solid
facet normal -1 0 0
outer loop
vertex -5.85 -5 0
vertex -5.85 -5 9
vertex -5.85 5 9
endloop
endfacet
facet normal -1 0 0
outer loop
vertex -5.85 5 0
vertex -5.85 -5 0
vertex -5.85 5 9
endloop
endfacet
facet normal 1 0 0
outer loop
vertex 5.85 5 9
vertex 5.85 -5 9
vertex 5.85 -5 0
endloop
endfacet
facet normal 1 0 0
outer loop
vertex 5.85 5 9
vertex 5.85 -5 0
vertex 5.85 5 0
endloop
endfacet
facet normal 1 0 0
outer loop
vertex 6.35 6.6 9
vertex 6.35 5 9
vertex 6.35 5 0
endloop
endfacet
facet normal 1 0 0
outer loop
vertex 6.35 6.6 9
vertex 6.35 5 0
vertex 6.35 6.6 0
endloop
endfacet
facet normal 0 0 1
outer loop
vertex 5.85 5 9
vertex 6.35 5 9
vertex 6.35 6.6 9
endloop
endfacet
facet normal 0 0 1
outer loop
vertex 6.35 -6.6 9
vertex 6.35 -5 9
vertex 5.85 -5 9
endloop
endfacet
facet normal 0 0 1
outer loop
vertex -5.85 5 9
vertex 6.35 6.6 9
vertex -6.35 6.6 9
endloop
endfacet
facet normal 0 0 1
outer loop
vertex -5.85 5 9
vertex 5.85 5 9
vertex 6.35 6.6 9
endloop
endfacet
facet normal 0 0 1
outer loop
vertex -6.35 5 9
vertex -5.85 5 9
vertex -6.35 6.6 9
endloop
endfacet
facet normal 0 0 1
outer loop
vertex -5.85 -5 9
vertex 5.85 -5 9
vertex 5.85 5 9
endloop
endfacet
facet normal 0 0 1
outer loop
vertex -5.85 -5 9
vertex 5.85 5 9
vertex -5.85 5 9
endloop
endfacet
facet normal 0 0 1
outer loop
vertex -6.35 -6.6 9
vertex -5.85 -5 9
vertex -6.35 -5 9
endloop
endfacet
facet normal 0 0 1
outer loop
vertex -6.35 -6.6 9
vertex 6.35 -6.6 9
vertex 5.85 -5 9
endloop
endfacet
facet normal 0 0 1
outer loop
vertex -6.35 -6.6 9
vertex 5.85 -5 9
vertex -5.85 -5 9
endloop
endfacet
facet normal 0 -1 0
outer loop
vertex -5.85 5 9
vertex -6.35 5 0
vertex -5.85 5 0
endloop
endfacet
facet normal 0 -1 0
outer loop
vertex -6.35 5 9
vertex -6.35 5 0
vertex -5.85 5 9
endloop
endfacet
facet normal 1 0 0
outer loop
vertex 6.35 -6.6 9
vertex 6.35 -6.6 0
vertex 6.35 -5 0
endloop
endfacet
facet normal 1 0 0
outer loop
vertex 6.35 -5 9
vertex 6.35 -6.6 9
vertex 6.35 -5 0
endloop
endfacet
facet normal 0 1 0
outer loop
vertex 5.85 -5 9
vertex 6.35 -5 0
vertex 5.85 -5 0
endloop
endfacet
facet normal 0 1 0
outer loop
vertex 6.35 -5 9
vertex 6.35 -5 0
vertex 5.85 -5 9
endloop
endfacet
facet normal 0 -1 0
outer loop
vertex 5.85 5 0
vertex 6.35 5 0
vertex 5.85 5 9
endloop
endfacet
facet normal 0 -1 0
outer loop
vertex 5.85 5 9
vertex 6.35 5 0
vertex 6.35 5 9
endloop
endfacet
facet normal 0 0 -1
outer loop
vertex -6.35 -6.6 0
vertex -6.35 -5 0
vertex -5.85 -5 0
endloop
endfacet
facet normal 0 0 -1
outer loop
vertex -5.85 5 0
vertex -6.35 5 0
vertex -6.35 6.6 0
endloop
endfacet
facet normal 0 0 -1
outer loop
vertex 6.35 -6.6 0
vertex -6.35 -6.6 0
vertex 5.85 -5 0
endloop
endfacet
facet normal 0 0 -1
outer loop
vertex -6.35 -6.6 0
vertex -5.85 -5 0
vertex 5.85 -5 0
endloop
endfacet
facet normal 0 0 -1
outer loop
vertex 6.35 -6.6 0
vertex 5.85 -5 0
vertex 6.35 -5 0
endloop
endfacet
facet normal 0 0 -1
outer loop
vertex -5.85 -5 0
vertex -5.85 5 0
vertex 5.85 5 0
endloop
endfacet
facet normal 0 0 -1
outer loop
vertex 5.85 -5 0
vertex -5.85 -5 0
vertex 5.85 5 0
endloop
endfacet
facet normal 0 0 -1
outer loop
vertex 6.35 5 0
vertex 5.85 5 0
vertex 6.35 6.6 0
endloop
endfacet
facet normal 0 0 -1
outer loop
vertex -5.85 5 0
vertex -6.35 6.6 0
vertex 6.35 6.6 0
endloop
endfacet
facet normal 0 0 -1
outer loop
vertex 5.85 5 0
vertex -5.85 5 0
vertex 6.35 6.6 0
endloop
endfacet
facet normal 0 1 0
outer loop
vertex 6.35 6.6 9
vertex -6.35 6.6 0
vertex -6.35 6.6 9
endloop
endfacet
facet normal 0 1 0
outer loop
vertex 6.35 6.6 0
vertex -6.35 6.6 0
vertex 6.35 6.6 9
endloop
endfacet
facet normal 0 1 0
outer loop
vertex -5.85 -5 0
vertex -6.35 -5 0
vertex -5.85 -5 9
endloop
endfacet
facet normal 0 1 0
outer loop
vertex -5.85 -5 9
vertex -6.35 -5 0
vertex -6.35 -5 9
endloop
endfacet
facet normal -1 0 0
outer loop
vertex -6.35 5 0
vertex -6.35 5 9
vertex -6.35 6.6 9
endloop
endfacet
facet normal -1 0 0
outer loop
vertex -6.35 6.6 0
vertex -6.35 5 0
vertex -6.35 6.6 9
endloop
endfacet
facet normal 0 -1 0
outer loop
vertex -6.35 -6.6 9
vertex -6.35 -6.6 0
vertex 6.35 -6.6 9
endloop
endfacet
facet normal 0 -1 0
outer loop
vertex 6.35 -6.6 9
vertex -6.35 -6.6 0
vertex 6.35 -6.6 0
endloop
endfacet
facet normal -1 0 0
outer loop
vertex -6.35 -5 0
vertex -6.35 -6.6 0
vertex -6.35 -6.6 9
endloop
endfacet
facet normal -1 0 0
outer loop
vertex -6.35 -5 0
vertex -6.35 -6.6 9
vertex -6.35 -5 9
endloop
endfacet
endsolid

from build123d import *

# Parameters (mm, degrees)
SKETCH_W        = 12.7
SKETCH_H        = 13.2
PAD_DEPTH       = 9.5
SKETCH004_W     = 10
SKETCH004_H     = 9.5
POCKET_DEPTH    = 0.5
POCKET001_DEPTH = 0.5


with BuildPart() as part:
    # Sketch → Pad (new body)
    with BuildSketch(Plane.XY):
        Rectangle(SKETCH_W, SKETCH_H)
    extrude(amount=PAD_DEPTH)

    # Sketch004 → Pocket (cut)
    with BuildSketch(Plane.YZ.offset(6.35)):
        with Locations((0, 4.75)):
            Rectangle(SKETCH004_W, SKETCH004_H)
    pocket = extrude(amount=-POCKET_DEPTH, mode=Mode.SUBTRACT)

    # Mirrored: Pocket across YZ
    add(pocket.mirror(Plane.YZ), mode=Mode.SUBTRACT)

    # Sketch005 → Pocket001 (cut)
    with BuildSketch(Plane.XY.offset(9.5)):
        Polygon((-6.35, 6.6), (6.35, 6.6), (6.35, 5), (5.85, 5), (5.85, 0), (-5.85, 0), (-5.85, 5), (-6.35, 5), align=None)
    pocket001 = extrude(amount=-POCKET001_DEPTH, mode=Mode.SUBTRACT)

    # Mirrored001: Pocket001 across XZ
    add(pocket001.mirror(Plane.XZ), mode=Mode.SUBTRACT)


solid = part.part
